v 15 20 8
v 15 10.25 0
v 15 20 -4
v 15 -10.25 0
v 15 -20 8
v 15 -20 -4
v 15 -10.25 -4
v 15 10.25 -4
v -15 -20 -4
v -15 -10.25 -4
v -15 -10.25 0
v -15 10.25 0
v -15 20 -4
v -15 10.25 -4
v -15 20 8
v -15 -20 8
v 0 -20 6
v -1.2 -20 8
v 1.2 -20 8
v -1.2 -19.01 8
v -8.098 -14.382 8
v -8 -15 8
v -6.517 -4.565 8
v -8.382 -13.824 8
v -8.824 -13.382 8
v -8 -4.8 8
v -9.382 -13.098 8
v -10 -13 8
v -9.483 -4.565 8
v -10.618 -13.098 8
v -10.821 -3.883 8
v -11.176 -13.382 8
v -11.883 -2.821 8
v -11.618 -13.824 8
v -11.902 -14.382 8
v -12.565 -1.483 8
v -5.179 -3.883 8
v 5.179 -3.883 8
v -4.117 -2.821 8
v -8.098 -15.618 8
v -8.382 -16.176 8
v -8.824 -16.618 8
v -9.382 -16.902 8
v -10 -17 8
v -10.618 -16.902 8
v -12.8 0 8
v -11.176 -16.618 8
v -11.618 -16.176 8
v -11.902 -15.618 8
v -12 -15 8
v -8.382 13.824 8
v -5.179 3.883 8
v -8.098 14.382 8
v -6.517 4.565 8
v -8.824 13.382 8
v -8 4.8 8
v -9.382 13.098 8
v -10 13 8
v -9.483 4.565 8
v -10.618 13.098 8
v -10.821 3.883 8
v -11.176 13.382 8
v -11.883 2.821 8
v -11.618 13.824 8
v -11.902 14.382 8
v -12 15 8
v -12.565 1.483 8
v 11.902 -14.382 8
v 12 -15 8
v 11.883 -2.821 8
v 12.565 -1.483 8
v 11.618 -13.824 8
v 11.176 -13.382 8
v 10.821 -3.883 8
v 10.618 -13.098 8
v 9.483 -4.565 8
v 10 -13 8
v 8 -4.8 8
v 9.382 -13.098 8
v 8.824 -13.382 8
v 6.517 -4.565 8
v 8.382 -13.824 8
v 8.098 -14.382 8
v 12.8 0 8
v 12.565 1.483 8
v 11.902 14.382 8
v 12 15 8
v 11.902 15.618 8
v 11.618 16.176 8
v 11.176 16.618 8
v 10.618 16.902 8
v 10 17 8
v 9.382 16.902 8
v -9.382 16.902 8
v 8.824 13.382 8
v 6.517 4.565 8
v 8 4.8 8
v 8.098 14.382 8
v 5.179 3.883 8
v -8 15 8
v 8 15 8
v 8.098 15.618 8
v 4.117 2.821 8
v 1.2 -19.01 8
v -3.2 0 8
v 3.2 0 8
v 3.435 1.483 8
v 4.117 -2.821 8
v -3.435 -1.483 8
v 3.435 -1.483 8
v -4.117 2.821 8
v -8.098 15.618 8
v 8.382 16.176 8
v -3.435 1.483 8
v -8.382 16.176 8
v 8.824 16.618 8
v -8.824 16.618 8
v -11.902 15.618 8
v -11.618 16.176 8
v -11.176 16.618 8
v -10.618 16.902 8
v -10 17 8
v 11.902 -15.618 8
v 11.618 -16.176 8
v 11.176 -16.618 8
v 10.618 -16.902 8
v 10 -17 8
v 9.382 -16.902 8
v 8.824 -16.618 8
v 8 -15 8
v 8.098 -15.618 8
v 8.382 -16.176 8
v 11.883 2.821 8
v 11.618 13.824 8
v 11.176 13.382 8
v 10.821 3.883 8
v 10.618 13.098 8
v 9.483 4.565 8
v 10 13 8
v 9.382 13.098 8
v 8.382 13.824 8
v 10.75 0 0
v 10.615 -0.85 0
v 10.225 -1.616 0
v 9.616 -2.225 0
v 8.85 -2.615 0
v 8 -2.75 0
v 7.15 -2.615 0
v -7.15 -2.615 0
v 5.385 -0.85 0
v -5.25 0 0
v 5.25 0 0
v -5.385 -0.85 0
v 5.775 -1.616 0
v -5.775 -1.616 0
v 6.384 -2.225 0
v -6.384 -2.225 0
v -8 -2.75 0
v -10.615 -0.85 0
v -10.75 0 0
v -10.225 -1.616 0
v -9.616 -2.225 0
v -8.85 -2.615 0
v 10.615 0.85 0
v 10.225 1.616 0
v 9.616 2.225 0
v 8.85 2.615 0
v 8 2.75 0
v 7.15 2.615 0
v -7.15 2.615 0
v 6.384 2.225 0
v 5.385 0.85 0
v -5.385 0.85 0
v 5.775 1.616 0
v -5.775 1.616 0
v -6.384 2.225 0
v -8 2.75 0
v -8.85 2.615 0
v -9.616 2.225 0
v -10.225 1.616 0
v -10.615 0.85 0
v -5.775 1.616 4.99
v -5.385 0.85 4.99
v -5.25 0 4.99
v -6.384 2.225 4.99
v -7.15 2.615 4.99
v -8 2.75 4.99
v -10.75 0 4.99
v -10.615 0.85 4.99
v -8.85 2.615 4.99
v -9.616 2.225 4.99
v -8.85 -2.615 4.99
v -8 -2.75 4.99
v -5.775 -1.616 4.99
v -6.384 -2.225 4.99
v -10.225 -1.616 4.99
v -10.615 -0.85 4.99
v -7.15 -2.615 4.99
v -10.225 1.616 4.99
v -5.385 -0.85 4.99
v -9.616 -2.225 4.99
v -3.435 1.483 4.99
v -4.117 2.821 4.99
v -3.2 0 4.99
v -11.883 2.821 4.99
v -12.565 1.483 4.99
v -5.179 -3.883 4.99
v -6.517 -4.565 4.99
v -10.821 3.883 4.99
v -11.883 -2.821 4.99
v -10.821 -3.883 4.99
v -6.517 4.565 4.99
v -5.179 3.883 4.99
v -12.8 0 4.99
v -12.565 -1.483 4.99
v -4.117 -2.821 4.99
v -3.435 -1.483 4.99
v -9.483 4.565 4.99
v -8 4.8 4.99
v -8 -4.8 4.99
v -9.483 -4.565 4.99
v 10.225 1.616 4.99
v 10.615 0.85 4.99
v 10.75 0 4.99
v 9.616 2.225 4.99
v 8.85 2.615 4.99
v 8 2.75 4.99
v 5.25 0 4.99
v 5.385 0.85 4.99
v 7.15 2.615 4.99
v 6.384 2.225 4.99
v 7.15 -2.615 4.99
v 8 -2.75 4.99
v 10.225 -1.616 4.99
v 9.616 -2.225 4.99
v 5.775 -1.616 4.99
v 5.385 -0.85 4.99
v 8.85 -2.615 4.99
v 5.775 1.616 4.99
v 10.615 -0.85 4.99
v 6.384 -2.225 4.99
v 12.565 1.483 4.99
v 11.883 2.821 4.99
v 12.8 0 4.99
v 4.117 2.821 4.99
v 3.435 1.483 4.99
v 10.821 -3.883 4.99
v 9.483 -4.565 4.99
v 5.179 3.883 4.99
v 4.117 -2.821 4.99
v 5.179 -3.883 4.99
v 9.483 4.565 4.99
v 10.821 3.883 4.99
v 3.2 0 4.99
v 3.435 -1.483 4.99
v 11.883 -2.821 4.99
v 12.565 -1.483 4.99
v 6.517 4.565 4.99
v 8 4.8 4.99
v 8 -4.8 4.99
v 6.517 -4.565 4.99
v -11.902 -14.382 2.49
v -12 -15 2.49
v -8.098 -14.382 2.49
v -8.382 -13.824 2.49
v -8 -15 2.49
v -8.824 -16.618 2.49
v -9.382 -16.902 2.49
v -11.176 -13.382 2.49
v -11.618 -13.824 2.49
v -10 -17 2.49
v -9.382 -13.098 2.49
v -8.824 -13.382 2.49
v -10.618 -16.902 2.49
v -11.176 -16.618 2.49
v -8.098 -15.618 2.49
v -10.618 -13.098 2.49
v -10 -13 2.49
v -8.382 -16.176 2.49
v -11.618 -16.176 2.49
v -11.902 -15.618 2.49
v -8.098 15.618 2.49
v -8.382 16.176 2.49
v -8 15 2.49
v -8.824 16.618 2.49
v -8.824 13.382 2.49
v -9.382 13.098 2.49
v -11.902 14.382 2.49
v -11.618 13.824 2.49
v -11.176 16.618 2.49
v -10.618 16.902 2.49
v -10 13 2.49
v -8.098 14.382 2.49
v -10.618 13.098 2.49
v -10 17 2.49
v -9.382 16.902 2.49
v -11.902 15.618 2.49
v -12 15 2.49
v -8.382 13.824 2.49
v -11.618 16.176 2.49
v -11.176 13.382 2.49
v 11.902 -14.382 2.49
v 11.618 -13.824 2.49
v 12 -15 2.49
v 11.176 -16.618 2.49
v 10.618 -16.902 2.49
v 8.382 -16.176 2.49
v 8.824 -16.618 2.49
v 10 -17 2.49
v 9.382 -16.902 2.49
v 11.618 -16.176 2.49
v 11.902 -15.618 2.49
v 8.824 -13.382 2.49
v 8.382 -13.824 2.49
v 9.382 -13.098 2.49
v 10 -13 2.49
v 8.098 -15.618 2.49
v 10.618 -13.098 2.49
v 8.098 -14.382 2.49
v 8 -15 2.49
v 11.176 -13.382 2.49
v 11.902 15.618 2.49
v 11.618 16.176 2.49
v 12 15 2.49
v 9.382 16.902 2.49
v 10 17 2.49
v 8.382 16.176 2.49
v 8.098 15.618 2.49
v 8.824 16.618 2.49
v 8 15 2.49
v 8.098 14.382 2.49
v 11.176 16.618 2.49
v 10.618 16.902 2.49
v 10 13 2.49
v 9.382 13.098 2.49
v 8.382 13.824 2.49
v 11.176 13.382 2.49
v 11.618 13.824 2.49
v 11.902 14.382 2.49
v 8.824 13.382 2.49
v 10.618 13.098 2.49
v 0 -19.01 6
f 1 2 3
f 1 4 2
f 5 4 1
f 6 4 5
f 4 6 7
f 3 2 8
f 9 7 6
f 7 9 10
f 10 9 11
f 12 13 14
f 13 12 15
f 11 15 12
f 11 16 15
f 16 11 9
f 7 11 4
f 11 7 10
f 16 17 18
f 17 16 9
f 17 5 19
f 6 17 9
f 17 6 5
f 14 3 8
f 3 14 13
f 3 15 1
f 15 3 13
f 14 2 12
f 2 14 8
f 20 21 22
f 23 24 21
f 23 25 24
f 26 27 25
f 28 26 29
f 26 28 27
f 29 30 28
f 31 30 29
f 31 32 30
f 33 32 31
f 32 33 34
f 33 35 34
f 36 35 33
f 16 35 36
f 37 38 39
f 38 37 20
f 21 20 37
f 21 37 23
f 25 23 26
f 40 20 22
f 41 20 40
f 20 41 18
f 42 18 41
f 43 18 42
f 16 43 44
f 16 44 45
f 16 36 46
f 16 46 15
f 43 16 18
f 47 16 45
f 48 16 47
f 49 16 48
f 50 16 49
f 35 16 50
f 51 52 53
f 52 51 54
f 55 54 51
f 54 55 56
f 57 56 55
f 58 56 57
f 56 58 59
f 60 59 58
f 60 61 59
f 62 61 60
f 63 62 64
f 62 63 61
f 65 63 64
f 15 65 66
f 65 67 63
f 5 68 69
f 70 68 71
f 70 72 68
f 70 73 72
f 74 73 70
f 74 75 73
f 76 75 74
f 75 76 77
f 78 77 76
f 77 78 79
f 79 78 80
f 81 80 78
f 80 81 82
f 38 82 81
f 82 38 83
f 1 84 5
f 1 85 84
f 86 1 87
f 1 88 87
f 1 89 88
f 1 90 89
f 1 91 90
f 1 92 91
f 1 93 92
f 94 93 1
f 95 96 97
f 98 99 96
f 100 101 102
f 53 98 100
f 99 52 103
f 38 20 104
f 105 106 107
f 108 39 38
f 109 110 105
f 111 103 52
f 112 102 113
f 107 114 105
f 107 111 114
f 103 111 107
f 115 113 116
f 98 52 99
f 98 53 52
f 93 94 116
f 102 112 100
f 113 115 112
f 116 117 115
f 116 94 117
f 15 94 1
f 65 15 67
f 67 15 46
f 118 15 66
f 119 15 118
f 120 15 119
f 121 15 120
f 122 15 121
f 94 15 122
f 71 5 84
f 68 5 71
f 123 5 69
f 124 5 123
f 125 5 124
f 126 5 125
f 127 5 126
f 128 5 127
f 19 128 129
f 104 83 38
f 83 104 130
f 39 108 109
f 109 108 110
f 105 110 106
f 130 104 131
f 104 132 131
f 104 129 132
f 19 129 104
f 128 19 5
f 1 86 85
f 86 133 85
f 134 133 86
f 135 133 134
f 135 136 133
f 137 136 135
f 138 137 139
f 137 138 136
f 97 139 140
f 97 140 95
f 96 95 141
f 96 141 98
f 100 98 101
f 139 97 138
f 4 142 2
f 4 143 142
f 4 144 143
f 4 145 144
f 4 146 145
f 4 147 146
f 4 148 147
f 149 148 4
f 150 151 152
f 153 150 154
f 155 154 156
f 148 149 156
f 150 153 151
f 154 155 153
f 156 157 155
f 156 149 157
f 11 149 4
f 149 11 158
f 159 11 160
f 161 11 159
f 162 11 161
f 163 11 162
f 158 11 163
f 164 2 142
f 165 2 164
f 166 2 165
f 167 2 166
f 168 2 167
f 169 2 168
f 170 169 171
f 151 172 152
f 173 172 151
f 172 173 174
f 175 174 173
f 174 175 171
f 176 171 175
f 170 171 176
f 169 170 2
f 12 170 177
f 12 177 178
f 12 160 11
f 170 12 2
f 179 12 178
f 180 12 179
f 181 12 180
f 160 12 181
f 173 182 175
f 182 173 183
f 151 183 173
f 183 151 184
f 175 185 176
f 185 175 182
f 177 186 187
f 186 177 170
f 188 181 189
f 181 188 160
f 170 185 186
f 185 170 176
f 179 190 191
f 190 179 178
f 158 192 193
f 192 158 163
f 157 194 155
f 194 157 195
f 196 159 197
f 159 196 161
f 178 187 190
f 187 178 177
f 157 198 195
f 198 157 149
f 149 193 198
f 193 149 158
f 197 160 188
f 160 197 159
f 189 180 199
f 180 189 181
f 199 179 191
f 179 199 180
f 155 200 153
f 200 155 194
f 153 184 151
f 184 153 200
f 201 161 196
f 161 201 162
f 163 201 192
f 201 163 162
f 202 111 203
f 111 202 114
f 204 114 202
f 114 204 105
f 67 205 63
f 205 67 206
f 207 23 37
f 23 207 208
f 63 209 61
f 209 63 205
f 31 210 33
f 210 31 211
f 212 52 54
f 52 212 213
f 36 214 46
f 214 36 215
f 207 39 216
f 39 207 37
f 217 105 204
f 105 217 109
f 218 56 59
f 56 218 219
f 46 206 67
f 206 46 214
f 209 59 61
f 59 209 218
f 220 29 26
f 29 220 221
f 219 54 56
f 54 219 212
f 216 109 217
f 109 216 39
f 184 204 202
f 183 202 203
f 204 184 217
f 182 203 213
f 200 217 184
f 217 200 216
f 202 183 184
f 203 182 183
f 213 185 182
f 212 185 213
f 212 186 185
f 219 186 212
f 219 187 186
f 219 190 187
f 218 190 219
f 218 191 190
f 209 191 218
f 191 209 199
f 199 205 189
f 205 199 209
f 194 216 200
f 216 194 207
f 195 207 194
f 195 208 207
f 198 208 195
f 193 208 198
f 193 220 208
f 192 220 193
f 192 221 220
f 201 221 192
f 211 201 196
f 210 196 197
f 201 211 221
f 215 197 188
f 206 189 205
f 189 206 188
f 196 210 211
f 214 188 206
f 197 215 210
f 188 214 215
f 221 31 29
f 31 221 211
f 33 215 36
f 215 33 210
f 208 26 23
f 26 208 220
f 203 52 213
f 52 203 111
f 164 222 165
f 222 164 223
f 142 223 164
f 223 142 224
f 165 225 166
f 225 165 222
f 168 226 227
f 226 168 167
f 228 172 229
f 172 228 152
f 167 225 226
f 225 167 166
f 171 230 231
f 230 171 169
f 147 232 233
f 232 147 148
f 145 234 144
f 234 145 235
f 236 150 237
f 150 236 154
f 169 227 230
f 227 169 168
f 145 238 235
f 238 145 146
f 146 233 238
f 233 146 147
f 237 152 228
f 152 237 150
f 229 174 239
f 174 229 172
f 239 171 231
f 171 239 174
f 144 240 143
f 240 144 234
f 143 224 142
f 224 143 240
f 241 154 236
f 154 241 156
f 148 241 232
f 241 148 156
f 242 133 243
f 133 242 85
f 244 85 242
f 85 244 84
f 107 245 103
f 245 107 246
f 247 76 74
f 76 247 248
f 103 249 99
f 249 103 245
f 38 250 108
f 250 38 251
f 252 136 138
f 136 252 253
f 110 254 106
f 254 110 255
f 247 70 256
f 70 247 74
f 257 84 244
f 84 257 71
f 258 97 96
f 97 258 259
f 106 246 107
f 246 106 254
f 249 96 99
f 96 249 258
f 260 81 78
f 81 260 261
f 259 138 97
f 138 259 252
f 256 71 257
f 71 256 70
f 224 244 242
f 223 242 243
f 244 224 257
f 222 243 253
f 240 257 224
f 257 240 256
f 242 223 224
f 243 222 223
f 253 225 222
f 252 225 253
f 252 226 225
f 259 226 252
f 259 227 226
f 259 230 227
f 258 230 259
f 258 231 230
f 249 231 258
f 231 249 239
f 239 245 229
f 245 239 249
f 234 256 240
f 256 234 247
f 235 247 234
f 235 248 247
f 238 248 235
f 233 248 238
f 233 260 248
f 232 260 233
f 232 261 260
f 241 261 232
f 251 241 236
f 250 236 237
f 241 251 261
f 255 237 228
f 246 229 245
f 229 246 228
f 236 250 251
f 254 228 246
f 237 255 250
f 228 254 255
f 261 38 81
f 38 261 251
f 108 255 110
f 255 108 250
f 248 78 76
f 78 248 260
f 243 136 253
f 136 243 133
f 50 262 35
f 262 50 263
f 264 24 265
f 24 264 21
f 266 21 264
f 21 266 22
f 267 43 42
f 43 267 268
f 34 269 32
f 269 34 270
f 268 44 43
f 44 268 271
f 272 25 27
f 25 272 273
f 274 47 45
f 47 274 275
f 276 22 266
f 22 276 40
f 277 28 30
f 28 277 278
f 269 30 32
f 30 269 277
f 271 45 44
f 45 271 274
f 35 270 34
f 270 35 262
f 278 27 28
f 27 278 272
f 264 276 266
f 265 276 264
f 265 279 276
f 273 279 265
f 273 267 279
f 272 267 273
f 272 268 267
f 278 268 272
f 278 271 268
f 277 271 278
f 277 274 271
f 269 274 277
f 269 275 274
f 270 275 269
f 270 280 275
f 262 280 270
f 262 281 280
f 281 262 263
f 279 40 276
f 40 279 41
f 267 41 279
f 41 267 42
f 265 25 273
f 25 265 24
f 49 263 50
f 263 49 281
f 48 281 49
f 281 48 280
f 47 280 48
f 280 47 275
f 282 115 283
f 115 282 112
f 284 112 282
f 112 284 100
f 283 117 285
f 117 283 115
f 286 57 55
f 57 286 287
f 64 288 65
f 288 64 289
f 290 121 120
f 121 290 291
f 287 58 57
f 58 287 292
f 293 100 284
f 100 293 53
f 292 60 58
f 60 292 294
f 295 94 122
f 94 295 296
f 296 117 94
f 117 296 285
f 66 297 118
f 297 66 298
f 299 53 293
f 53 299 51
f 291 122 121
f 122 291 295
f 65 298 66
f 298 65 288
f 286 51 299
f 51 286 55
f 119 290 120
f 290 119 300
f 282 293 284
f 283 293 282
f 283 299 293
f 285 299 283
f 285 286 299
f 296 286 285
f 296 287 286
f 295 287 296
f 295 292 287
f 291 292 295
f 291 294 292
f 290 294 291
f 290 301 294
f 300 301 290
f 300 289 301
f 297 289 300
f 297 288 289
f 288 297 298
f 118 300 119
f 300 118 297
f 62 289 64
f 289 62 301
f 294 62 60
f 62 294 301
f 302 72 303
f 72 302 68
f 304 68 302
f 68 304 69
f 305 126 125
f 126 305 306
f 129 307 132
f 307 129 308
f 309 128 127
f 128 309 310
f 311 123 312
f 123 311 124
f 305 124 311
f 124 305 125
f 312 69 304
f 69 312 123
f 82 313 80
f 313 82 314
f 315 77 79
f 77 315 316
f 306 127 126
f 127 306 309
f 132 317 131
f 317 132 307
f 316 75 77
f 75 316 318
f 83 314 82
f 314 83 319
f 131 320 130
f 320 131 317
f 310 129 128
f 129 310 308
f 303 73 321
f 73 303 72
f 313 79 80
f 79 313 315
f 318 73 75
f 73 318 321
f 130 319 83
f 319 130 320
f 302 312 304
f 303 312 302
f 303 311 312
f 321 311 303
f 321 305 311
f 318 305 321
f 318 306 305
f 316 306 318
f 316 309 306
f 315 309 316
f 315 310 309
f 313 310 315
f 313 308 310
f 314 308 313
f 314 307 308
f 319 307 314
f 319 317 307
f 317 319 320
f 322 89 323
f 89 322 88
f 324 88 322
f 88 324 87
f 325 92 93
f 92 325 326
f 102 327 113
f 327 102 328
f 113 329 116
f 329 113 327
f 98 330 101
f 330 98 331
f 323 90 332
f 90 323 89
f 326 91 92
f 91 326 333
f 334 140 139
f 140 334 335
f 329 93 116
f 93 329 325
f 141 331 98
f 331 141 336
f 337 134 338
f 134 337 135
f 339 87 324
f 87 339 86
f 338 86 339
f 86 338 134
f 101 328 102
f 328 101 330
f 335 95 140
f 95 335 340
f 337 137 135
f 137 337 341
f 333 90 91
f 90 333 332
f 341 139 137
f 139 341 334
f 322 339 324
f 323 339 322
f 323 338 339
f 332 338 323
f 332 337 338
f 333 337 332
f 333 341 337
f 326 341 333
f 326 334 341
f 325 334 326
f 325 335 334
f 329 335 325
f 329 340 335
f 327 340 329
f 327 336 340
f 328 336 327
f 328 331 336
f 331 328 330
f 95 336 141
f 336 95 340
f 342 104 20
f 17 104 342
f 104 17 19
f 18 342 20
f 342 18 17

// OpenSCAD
// file: layout_gen.scad
// layout_gen.scad: optical layout of the laboratory bench: element positions, rails, carrier positions and required
// beam diameters. Every other file takes its positions from here.
// Units: mm. Top view: x to the east, y to the north; z up. Beams travel in the plane z = rail + axis_h.
f0 = 230.3615;
cube = 25.400;
gap = 12.000;
x3 = 75.000;
lens_d = 50.800;
opt_d = 25.400;
rail = 20.000;
axis_h = 60.000;
obj_w = 8.1920;
pupil_d = 15.3190;
ring2_d = 4.3085;
roi_d = 4.7872;
stop_d = 0.2394;
ring2_inner_d = 2.3936;
P_fibre = [262.700, 0.000, 180];   // laser output (fiber tip)
P_col = [162.700, 0.000, 180];   // collimator
P_pol = [120.200, 0.000, 180];   // polarizer
P_bs0 = [75.000, 0.000, 180];   // splitter cube
P_c1 = [0.000, 0.000, 180];   // input cube
P_im = [-24.700, 0.000, 180];   // input modulator
P_dump1 = [0.000, 42.700, 90];   // beam dump
P_an1 = [0.000, -57.700, 270];   // analyzer 1
P_l1 = [0.000, -214.345, 270];   // lens L1
P_c2 = [0.000, -428.691, 270];   // Fourier cube
P_am = [0.000, -453.391, 270];   // amplitude modulator
P_fc = [-24.700, -428.691, 180];   // Fourier camera with zero-order stop
P_an2 = [37.500, -428.691, 0];   // analyzer 2
P_sh = [75.000, -120.000, 270];   // reference shutter
P_va = [75.000, -200.000, 270];   // variable attenuator
P_c3 = [75.000, -428.691, 0];   // combiner cube
P_pm = [75.000, -519.707, 270];   // phase modulator with annular stop
P_l2 = [223.029, -428.691, 0];   // lens L2
P_is = [453.391, -428.691, 0];   // image sensor
P_as = [75.000, -505.707, 270];   // annular stop
R_north = [-79.700, 0.000, 307.700, 0.000];
R_south = [-79.700, -428.691, 508.391, -428.691];
R_west = [0.000, -30.000, 0.000, -398.691];
R_ref = [75.000, -30.000, 75.000, -398.691];
R_stub = [75.000, -458.691, 75.000, -579.707];
C_fibre = [262.700, 0.000, 0];   // carrier center, rail direction in degrees
C_col = [162.700, 0.000, 0];   // carrier center, rail direction in degrees
C_pol = [120.200, 0.000, 0];   // carrier center, rail direction in degrees
C_bs0 = [75.000, 0.000, 0];   // carrier center, rail direction in degrees
C_c1 = [0.000, 0.000, 0];   // carrier center, rail direction in degrees
C_im = [-45.000, 0.000, 0];   // carrier center, rail direction in degrees
C_an1 = [0.000, -57.700, 90];   // carrier center, rail direction in degrees
C_l1 = [0.000, -214.345, 90];   // carrier center, rail direction in degrees
C_fc = [-45.000, -428.691, 0];   // carrier center, rail direction in degrees
C_c2 = [0.000, -428.691, 0];   // carrier center, rail direction in degrees
C_an2 = [37.500, -428.691, 0];   // carrier center, rail direction in degrees
C_c3 = [75.000, -428.691, 0];   // carrier center, rail direction in degrees
C_l2 = [223.029, -428.691, 0];   // carrier center, rail direction in degrees
C_is = [477.391, -428.691, 0];   // carrier center, rail direction in degrees
C_sh = [75.000, -120.000, 90];   // carrier center, rail direction in degrees
C_va = [75.000, -200.000, 90];   // carrier center, rail direction in degrees
C_as = [75.000, -505.707, 90];   // carrier center, rail direction in degrees
C_pm = [75.000, -540.007, 90];   // carrier center, rail direction in degrees
carrier_l = 30.000;
tray = [183.029, -310.000, 200.000, 150.000];   // electronics tray: x0, y0, width, depth
ca_icube = 13.4949;   // required beam diameter at the input cube
ca_lens = 26.9043;   // required beam diameter at the Fourier lenses L1 and L2
ca_fcube = 16.7632;   // required beam diameter at the Fourier cube
ca_comb = 20.0983;   // required beam diameter at the combiner cube
ca_sensor = 11.5852;   // required beam diameter at the image sensor
FOOT = [-119.700, -619.707, 548.391, 127.700];   // x_min, y_min, x_max, y_max
// file: parts_misc.scad
// parts_misc.scad: fiber holder, laser V-block, shutter bracket and flag, beam dump, rail foot, corner bracket,
// enclosure post, electronics tray.
// DESIGN ONLY: not printed, not built.
// Local frames: holders as in parts_mounts.scad (z = 0 = carrier top, beam along +x through (0, 0, ha));
// beam dump, rail foot, corner bracket, post and tray stand on the base board (z = 0 = board).
// Print orientation: as modeled; the shutter flag flat. No supports except the servo window (bridged).
// Hardware: fiber adapter 2 x M2.5; V-block strap 2 x M3; servo 2 x M2 self-tapping; rail foot and corner
// bracket M5 into T-nuts plus one screw into the base board; post 2 screws into the board; tray boards on
// M3 stand-offs or adhesive clips.
include <params.scad>
use <parts_mounts.scad>

module hole_x(d, l) { rotate([0, 90, 0]) translate([0, 0, -0.01]) cylinder(d = d, h = l + 0.02, $fn = fn_s); }

// ---- 6a. fiber holder: plate with a bore for a bulkhead fiber adapter, tip at the collimator focus.
fib_bore = 9.6;     // bulkhead adapter barrel (generic; set to the adapter used)
fib_pitch = 14;     // flange screw pitch (generic)
module fiber_holder() {
  w = 40; top = ha + 16;
  difference() {
    union() {
      foot();
      translate([-3, -w / 2, 0]) cube([6, w, top]);
    }
    translate([-3, 0, ha]) hole_x(fib_bore, 6);
    for (s = [-1, 1]) translate([-3, s * fib_pitch / 2, ha]) hole_x(m25_d, 6);
  }
}

// ---- 6b. V-block for a 12 mm laser module barrel (alternative to the fiber holder).
module laser_vblock(d = 12) {
  h = ha - d / 2 * sqrt(2);                                // bottom of the V so that the barrel axis is at ha
  difference() {
    union() {
      foot();
      translate([-car_l / 2, -12, 0]) cube([car_l, 24, ha + 2]);
    }
    translate([-car_l / 2 - 0.01, 0, h]) rotate([90, 0, 90]) linear_extrude(car_l + 0.02)
      polygon([[0, 0], [14, 14], [-14, 14]]);
    for (s = [-1, 1]) translate([0, s * 9.5, ha + 2 - m3_ins_h]) cylinder(d = m3_ins, h = m3_ins_h + 0.01, $fn = fn_s);
  }
}

// ---- 7a. shutter bracket: upright with a clear bore for the reference beam and a window for a micro servo
// whose shaft is parallel to the beam, above it. The flag swings in the plane normal to the beam.
module shutter_bracket() {
  w = 46; top = ha + sh_axis + servo_h / 2 + 6;
  difference() {
    union() {
      foot();
      translate([-3, -w / 2, 0]) cube([6, w, top]);
    }
    translate([-3, 0, ha]) hole_x(sh_bore, 6);
    translate([-3.01, -servo_w / 2, ha + sh_axis - servo_h / 2]) cube([6.02, servo_w, servo_h]);
    for (s = [-1, 1]) translate([-3, s * servo_ear / 2, ha + sh_axis]) hole_x(1.8, 6);
  }
}

// ---- 7b. shutter flag: paddle on the servo horn; covers the bore when turned down.
module shutter_flag() {
  difference() {
    union() {
      cylinder(d = 12, h = 1.6);
      translate([-13, -sh_axis - 14, 0]) cube([26, sh_axis + 14, 1.6]);
    }
    translate([0, 0, -0.01]) cylinder(d = 4.9, h = 1.62, $fn = fn_s);       // horn hub
    for (s = [-1, 1]) translate([0, s * 4, -0.01]) cylinder(d = 1.5, h = 1.62, $fn = fn_s);
  }
}

// ---- 8. beam dump on a pedestal standing on the base board; entrance faces -x at the axis height.
module beam_dump() {
  b = 34; depth = 34;
  difference() {
    union() {
      translate([-5, -25, 0]) cube([depth + 10, 50, 5]);                    // flange
      translate([0, -b / 2, 0]) cube([depth, b, ha_board + b / 2]);
    }
    translate([-0.01, 0, ha_board]) difference() {                           // blind bore with a cone at the bottom
      rotate([0, 90, 0]) cylinder(d = 24, h = depth - 5);
      translate([depth - 5 - 14, 0, 0]) rotate([0, 90, 0]) cylinder(d1 = 2, d2 = 20, h = 14.01);
    }
    for (s = [-1, 1]) translate([depth / 2, s * 21, -0.01]) cylinder(d = 4.5, h = 5.02, $fn = fn_s);
  }
}

// ---- 9a. rail foot: angle clip that fixes a rail to the base board (M5 into the side slot, screw into the board).
module rail_foot() {
  difference() {
    union() {
      cube([20, 22, 5]);
      cube([20, 5, 15]);
    }
    translate([10, 5 + 9, -0.01]) cylinder(d = 4.5, h = 5.02, $fn = fn_s);
    translate([10, -0.01, 10]) rotate([-90, 0, 0]) cylinder(d = m5_d, h = 5.02, $fn = fn_s);
  }
}

// ---- 9b. corner bracket: joins two rails at a right angle through their side slots; bridges the end gap.
// 15 mm high so that it passes under the carrier skirts.
module corner_bracket(gap = 20) {
  la = 34; lb = gap + 34;
  difference() {
    union() {
      cube([la, 5, 15]);
      cube([5, lb, 15]);
      linear_extrude(4) polygon([[0, 0], [la, 0], [0, 26]]);
    }
    translate([la - 10, -0.01, 10]) rotate([-90, 0, 0]) cylinder(d = m5_d, h = 5.02, $fn = fn_s);
    translate([-0.01, lb - 10, 10]) rotate([0, 90, 0]) cylinder(d = m5_d, h = 5.02, $fn = fn_s);
  }
}

// ---- 10a. enclosure post: corner post with two slots that take 3 mm opaque sheet panels.
module enclosure_post(sheet = 3.2) {
  difference() {
    union() {
      cube([24, 24, post_h]);
      cube([44, 44, 5]);
    }
    translate([24 - 10, 8, 5]) cube([10.01, sheet, post_h]);                // slot towards +x
    translate([8, 24 - 10, 5]) cube([sheet, 10.01, post_h]);                // slot towards +y
    for (p = [[34, 12], [12, 34]]) translate([p[0], p[1], -0.01]) cylinder(d = 4.5, h = 5.02, $fn = fn_s);
  }
}

// ---- 10b. electronics tray: bays for a USB hub, three panel driver boards and a microcontroller board.
tray_bays = [[4, 4, 100, 52], [108, 4, 88, 52], [4, 60, 62, 86], [70, 60, 62, 86], [136, 60, 60, 86]];
module electronics_tray() {
  difference() {
    cube([tray[2], tray[3], 8]);                                           // bays below assume 200 x 150
    for (b = tray_bays) translate([b[0], b[1], 2]) cube([b[2], b[3], 6.01]);
    for (p = [[6, 6], [194, 6], [6, 144], [194, 144]]) translate([p[0], p[1], -0.01]) cylinder(d = 4.5, h = 8.02, $fn = fn_s);
  }
}
// file: parts_panels.scad
// parts_panels.scad: mounts for the reflective modulator panels and for the two camera boards.
// DESIGN ONLY: not printed, not built. The board outlines are generic; replace them by the drawings of the chosen
// commercial parts (params.scad: pan_bw, pan_bh, pan_stack, cam_b, cam_hole, cam_stack).
// Local frame: the active surface (panel or sensor) is centered at (0, 0, h_axis) and faces -x; the beam arrives
// travelling along +x; every printed body lies at x > 0 except the stop cap. z = 0 is the mounting face.
// Print orientation: frames and camera mounts as modeled (foot down); tilt plate, stop cap and slide parts flat.
// Hardware: panel board 4 x M2.5; tilt plate 3 x M3 x 16 with compression springs into inserts of the frame;
// camera board 4 x M2; slide 2 x M3 x 12 in slots, 1 x M3 fine screw; frames 4 x M3 x 10 into the carrier
// (rail version) or 2 x M5 into the base board (board version).
include <params.scad>
use <parts_mounts.scad>

pan_pw = pan_bw + 16;                    // tilt plate width
pan_ph = pan_bh + 16;                    // tilt plate height
pan_adj = [[-(pan_pw / 2 - 5), pan_ph / 2 - 5], [pan_pw / 2 - 5, pan_ph / 2 - 5], [-(pan_pw / 2 - 5), -(pan_ph / 2 - 5)]];
x_plate = pan_stack;                     // tilt plate front face (board back face)
x_frame = pan_stack + pan_plate_t + pan_gap;
foot_x  = 20.3;                          // carrier center behind the active surface (layout: C_im, C_fc, C_pm)

module hole_x(d, l) { rotate([0, 90, 0]) translate([0, 0, -0.01]) cylinder(d = d, h = l + 0.02, $fn = fn_s); }

// ---- 4a. tip/tilt plate: carries the panel board on its front face. Modelled in place (x from x_plate).
module panel_tilt_plate(h_axis = ha) {
  difference() {
    translate([x_plate, -pan_pw / 2, h_axis - pan_ph / 2]) cube([pan_plate_t, pan_pw, pan_ph]);
    for (p = pan_adj) translate([x_plate, p[0], h_axis + p[1]]) hole_x(m3_d, pan_plate_t);
    for (sy = [-1, 1], sz = [-1, 1])     // board screws in horizontal slots: lateral adjustment
      hull() for (dy = [-pan_slot / 2, pan_slot / 2])
        translate([x_plate, sy * (pan_bw / 2 - 3) + dy, h_axis + sz * (pan_bh / 2 - 3)]) hole_x(m25_d, pan_plate_t);
  }
}

// ---- 4b. fixed frame. on_board = false: foot on a rail carrier; true: pedestal on the base board (taller).
module panel_frame(on_board = false) {
  h_axis = on_board ? ha_board : ha;
  top = h_axis + pan_ph / 2;
  difference() {
    union() {
      if (on_board) translate([foot_x - 22, -30, 0]) cube([44, 60, foot_t]);
      else translate([foot_x, 0, 0]) foot();
      translate([x_frame, -pan_pw / 2, 0]) cube([pan_frame_t, pan_pw, top]);
      for (s = [-1, 1]) translate([0, s * ((on_board ? 30 : car_w / 2) - 2), foot_t])   // gussets behind the frame
        rotate([90, 0, 0]) translate([0, 0, -2]) linear_extrude(4)
          polygon([[x_frame + pan_frame_t, 0], [foot_x + 14, 0], [x_frame + pan_frame_t, on_board ? 40 : 22]]);
    }
    for (p = pan_adj) translate([x_frame, p[0], h_axis + p[1]]) hole_x(m3_ins, pan_frame_t);
    translate([x_frame, 0, h_axis]) hole_x(18, pan_frame_t);                  // cable window
    if (on_board) for (s = [-1, 1]) hull() for (dx = [-4, 4])                 // 2 x M5 slots into the base board
      translate([foot_x + 8 + dx, s * 22, -0.01]) cylinder(d = m5_d, h = foot_t + 0.02, $fn = fn_s);
  }
}

// ---- 5a. fixed camera mount (Fourier camera). Board back face at x = cam_stack, on four bosses.
module camera_upright(h_axis, x0) {                      // upright with bosses; x0 = front face of the upright
  w = cam_b + 8;
  difference() {
    union() {
      translate([x0, -w / 2, 0]) cube([6, w, h_axis + cam_b / 2 + 4]);
      for (sy = [-1, 1], sz = [-1, 1]) translate([cam_stack, sy * cam_hole / 2, h_axis + sz * cam_hole / 2])
        rotate([0, 90, 0]) cylinder(d = 6, h = x0 - cam_stack + 0.01, $fn = fn_s);
    }
    for (sy = [-1, 1], sz = [-1, 1]) translate([cam_stack, sy * cam_hole / 2, h_axis + sz * cam_hole / 2])
      hole_x(m2_d, x0 - cam_stack + 6);
    translate([x0, 0, h_axis]) hole_x(20, 6);                                 // connector window
  }
}

module camera_mount_fixed() {
  union() {
    translate([foot_x, 0, 0]) foot();
    camera_upright(ha, cam_stack + 3);
  }
}

// ---- 5b. zero-order stop cap: holds a 12.7 mm window with the stop dot close in front of the sensor.
// Modelled in place: plate at x = -3 .. -1, legs back to the board front face.
module stop_cap(h_axis = ha) {
  board_front = cam_stack - 1.6;
  difference() {
    union() {
      translate([-3, -cam_b / 2, h_axis - cam_b / 2]) cube([2, cam_b, cam_b]);
      for (sy = [-1, 1], sz = [-1, 1]) translate([-1.01, sy * cam_hole / 2, h_axis + sz * cam_hole / 2])
        rotate([0, 90, 0]) cylinder(d = 5, h = board_front + 1.01, $fn = fn_s);
    }
    for (sy = [-1, 1], sz = [-1, 1]) translate([-3, sy * cam_hole / 2, h_axis + sz * cam_hole / 2])
      hole_x(m2_d, board_front + 3);
    translate([-3, 0, h_axis]) hole_x(stop_hole, 2);                          // light path
    translate([-3, 0, h_axis]) hole_x(12.7 + 2 * clr, 1.0);                   // window pocket
  }
}

// ---- 5c. image sensor on a fine-focus slide along the beam. Base on the carrier (center at x = 24).
slide_c = 24;                            // carrier center (layout: C_is)
module camera_slide_base() {
  difference() {
    union() {
      translate([-4, -car_w / 2, 0]) cube([56, car_w, foot_t]);
      translate([46, -10, 0]) cube([6, 20, foot_t + 14]);                     // end block of the fine screw
    }
    for (sx = [-1, 1], sy = [-1, 1]) translate([slide_c + sx * pat_x, sy * pat_y, 0]) {
      translate([0, 0, -0.01]) cylinder(d = m3_d, h = foot_t + 0.02, $fn = fn_s);
      translate([0, 0, foot_t - 3.2]) cylinder(d = 6.2, h = 3.3, $fn = fn_s);  // heads below the carriage
    }
    for (sy = [-1, 1]) translate([22, sy * 12, foot_t - m3_ins_h]) cylinder(d = m3_ins, h = m3_ins_h + 0.01, $fn = fn_s);
    translate([46, 0, foot_t + 8]) hole_x(m3_ins, 6);                         // M3 x 0.5 fine screw, along the beam
  }
}

module camera_slide_carriage() {
  difference() {
    union() {
      translate([3, -car_w / 2, foot_t]) cube([38, car_w, 6]);
      translate([0, 0, foot_t]) camera_upright(ha - foot_t, cam_stack + 3);
    }
    for (sy = [-1, 1]) hull() for (dx = [-slide_travel, slide_travel])        // slots: +- travel
      translate([22 + dx, sy * 12, foot_t - 0.01]) cylinder(d = m3_d, h = 6.02, $fn = fn_s);
  }
}
// file: parts_mounts.scad
// parts_mounts.scad: rail carrier, lens / optic holder with retaining ring, cube table with clamp.
// DESIGN ONLY: not printed, not built.
// Local frame of every holder: z = 0 is the top face of the rail carrier, the beam travels along +x through
// (0, 0, ha). Print orientation: as modeled (foot down), no supports; bores bridge at the top.
// Hardware: carrier 2 x M5 x 10 into rail T-nuts, 4 x M3 heat-set inserts; holders 4 x M3 x 10 into the carrier;
// retaining ring 3 x M3 x 8 into inserts of the holder; cube clamp 1 x M3 x 12 + 1 x M3 nylon-tip set screw.
include <params.scad>

module hole(d, h, fn = fn_s) { translate([0, 0, -0.01]) cylinder(d = d, h = h + 0.02, $fn = fn); }

// ---- foot plate with the 4 x M3 pattern of the carrier (local x = along the rail)
module foot(l = car_l, w = car_w) {
  difference() {
    translate([-l / 2, -w / 2, 0]) cube([l, w, foot_t]);
    for (sx = [-1, 1], sy = [-1, 1]) translate([sx * pat_x, sy * pat_y, 0]) hole(m3_d, foot_t);
  }
}

// ---- 1. rail carrier: saddle on the rail. Local x = along the rail, z = 0 at the rail top face.
module rail_carrier() {
  difference() {
    union() {
      translate([-car_l / 2, -car_w / 2, 0]) cube([car_l, car_w, car_t]);
      for (s = [-1, 1])                                   // skirts along both rail sides
        translate([-car_l / 2, s > 0 ? rail / 2 + clr : -car_w / 2, -car_skirt])
          cube([car_l, car_w / 2 - rail / 2 - clr, car_skirt + 0.01]);
    }
    for (s = [-1, 1]) translate([s * 8, 0, 0]) {          // 2 x M5 into T-nuts, counterbored
      hole(m5_d, car_t);
      translate([0, 0, car_t - 3]) hole(m5_head, 3.5);
    }
    for (sx = [-1, 1], sy = [-1, 1])                      // 4 x M3 inserts for the holders
      translate([sx * pat_x, sy * pat_y, car_t - m3_ins_h]) hole(m3_ins, m3_ins_h);
    translate([0, -car_w / 2 - 0.01, car_t - 2]) rotate([-90, 0, 0])   // index mark at the center
      linear_extrude(1) polygon([[-1.5, -2.5], [1.5, -2.5], [0, 0]]);
  }
}

// ---- 2. holder for a round optic of diameter d, centered on the beam at height h_axis above the foot bottom
module lens_holder(d = lens_d, h_axis = ha) {
  w = d + 2 * rim;
  top = h_axis + d / 2 + rim;
  bc = d / 2 + 5.5;                                       // bolt circle of the retaining ring
  difference() {
    union() {
      foot(car_l, max(car_w, w));
      translate([-up_t / 2, -w / 2, 0]) cube([up_t, w, top]);
      for (s = [-1, 1]) translate([0, s * (w / 2 - 3), foot_t])   // two gussets
        rotate([90, 0, 0]) translate([0, 0, -1.5]) linear_extrude(3)
          polygon([[-car_l / 2, 0], [car_l / 2, 0], [up_t / 2, 12], [-up_t / 2, 12]]);
    }
    translate([-up_t / 2, 0, h_axis]) rotate([0, 90, 0]) hole(d - 2 * lip - 0.6, up_t, $fn);          // clear bore
    translate([up_t / 2 - seat_d, 0, h_axis]) rotate([0, 90, 0]) hole(d + 2 * clr, seat_d, $fn);    // seat
    for (a = [90, 210, 330]) translate([up_t / 2 - m3_ins_h, bc * cos(a), h_axis + bc * sin(a)])
      rotate([0, 90, 0]) hole(m3_ins, m3_ins_h);
  }
}

module retaining_ring(d = lens_d) {
  bc = d / 2 + 5.5;
  difference() {
    cylinder(d = d + 2 * rim - 2, h = ring_t);
    hole(d - 2 * lip - 0.6, ring_t, $fn);
    for (a = [90, 210, 330]) translate([bc * cos(a), bc * sin(a), 0]) hole(m3_d, ring_t);
  }
}

// ---- 3. cube table: seat for the beam-splitter cube, center on the beam; four free ports.
module cube_table() {
  seat = ha - cube / 2;                                   // seat height above the foot bottom
  pw = cube + 2 * cube_fence_t + 2 * clr;                 // pedestal width
  difference() {
    union() {
      foot();
      translate([-pw / 2, -pw / 2, 0]) cube([pw, pw, seat]);
      // locating corner: two fences, lower than the beam
      translate([-pw / 2, -pw / 2, seat]) cube([pw, cube_fence_t, cube_fence_h]);
      translate([-pw / 2, -pw / 2, seat]) cube([cube_fence_t, pw, cube_fence_h]);
      // clamp post at the locating corner, outside every beam port
      translate([-pw / 2 - cube_post + cube_fence_t, -pw / 2 - cube_post + cube_fence_t, 0])
        cube([cube_post, cube_post, seat + cube + 1]);
    }
    // post: insert for the clamp screw
    translate([-pw / 2 - cube_post / 2 + cube_fence_t, -pw / 2 - cube_post / 2 + cube_fence_t,
               seat + cube + 1 - m3_ins_h]) hole(m3_ins, m3_ins_h);
    // access to the foot screws under the pedestal overhang is from the sides: nothing to cut
  }
}

// ---- cube clamp: plate over the cube top, bolted on the post, set screw over the cube center.
module cube_clamp() {
  pw = cube + 2 * cube_fence_t + 2 * clr;
  o = -pw / 2 - cube_post + cube_fence_t;                 // outer corner of the post
  difference() {
    translate([o, o, 0]) cube([cube / 2 - o + 6, cube / 2 - o + 6, 4]);
    translate([o + cube_post / 2, o + cube_post / 2, 0]) hole(m3_d, 4);
    hole(2.9, 4);                                         // M3 tapped (self-cut) for the nylon-tip set screw
  }
}
// file: params.scad
// params.scad: every mechanical parameter of the printed mount kit (reference hardware design).
// DESIGN ONLY: not printed, not built.
// Optical layout numbers (stations, rails, beam sizes) are defined in layout_gen.scad and follow from the optical
// parameters of the design. Do not retype positions here.
include <layout_gen.scad>

// ---- print and fit
clr      = 0.25;    // general print clearance per side
$fn      = 48;      // facets of optical bores (screw holes use fn_s)
fn_s     = 20;

// ---- fasteners
m5_d     = 5.5;     // M5 clearance (rail T-nuts)
m5_head  = 9.6;     // M5 button-head counterbore diameter
m3_d     = 3.4;     // M3 clearance
m3_ins   = 4.0;     // hole for an M3 heat-set insert
m3_ins_h = 5.5;     // insert hole depth
m25_d    = 2.9;     // M2.5 clearance (boards)
m2_d     = 2.4;     // M2 clearance (camera boards)

// ---- rail carrier (saddle on the 20 x 20 slotted rail)
car_l    = carrier_l;   // along the rail (from the layout: neighboring carriers must not overlap)
car_w    = 40;          // across the rail
car_t    = 8;           // plate thickness above the rail top
car_skirt = 4;          // skirt depth down the rail sides
pat_x    = 10;          // M3 insert pattern, half pitch along the rail
pat_y    = 15;          // M3 insert pattern, half pitch across the rail

// ---- heights
z_carrier = rail + car_t;          // top face of a carrier above the base board
ha        = axis_h - car_t;        // optical axis above the top face of a carrier (52 mm)
ha_board  = rail + axis_h;         // optical axis above the base board (80 mm)

// ---- holders
foot_t   = 6;       // foot plate thickness of every holder
up_t     = 10;      // upright thickness along the beam
rim      = 10;      // material around a bore
lip      = 1.2;     // seat lip that the optic rests on
seat_d   = 6;       // seat depth
ring_t   = 3;       // retaining ring thickness

// ---- cube table
cube_fence_h = 1.5; // locating fences (below the beam: the beam bottom is 10.05 mm below the cube center)
cube_fence_t = 3;
cube_post    = 8;   // clamp post section

// ---- panel mount (reflective modulator on a carrier board)
pan_bw   = 40;      // board width (horizontal)
pan_bh   = 32;      // board height
pan_stack = 3.0;    // reflective surface in front of the board back face
pan_plate_t = 4;    // tip/tilt plate thickness
pan_gap  = 4;       // spring gap between the tilt plate and the frame
pan_frame_t = 6;
pan_slot = 3.0;     // board slots: +-1.5 mm lateral adjustment

// ---- camera boards
cam_b    = 38;      // square board
cam_hole = 34;      // hole pitch
cam_stack = 4.0;    // sensor surface in front of the board back face
slide_travel = 3;   // +- fine focus travel of the image sensor

// ---- shutter (micro servo)
servo_w  = 23.0;    // body
servo_h  = 12.6;
servo_ear = 28.0;   // screw pitch
sh_bore  = 22;      // clear bore of the shutter bracket
sh_axis  = sh_bore / 2 + 6 + servo_h / 2;   // servo shaft above the beam axis
post_h   = 130;     // enclosure post height
stop_hole = 10;     // light hole of the zero-order stop cap (the camera reads the central roi_d only)

// ---- beams used by the clearance check (diameters from the layout; the check adds beam_margin in assembly.scad)
beam_col  = obj_w * sqrt(2);       // collimated beam over the object diagonal
beam_lens = pupil_d + obj_w * sqrt(2);
beam_ref  = 8;                     // the reference arm uses the central ring2_d = 4.31 mm only
beam_fc   = 8;                     // the Fourier camera reads the central roi_d = 4.79 mm only

// ---- colors of the assembly
c_print = "#CFCECE";  c_rail = "#6F6F6F";  c_l1 = "#3775BA";  c_l2 = "#DAA87C";  c_beam = "#8BCF8B";
c_glass = "#B8C9E5";
// main file
// export.scad: one printable part per call:  openscad -D 'part="lens_holder_50"' -o ../stl/lens_holder_50.stl export.scad
// DESIGN ONLY: not printed, not built. Parts are exported in their modeled frame (see the part files for the
// print orientation); panel_tilt_plate, stop_cap and camera_slide_carriage are moved to the origin of their own
// frame by the slicer.
include <params.scad>
use <parts_mounts.scad>
use <parts_panels.scad>
use <parts_misc.scad>
part = "rail_carrier";
if (part == "rail_carrier") rail_carrier();
if (part == "lens_holder_50") lens_holder(lens_d);
if (part == "lens_holder_25") lens_holder(opt_d);
if (part == "lens_holder_12") lens_holder(opt_d / 2);
if (part == "retaining_ring_50") retaining_ring(lens_d);
if (part == "retaining_ring_25") retaining_ring(opt_d);
if (part == "retaining_ring_12") retaining_ring(opt_d / 2);
if (part == "cube_table") cube_table();
if (part == "cube_clamp") cube_clamp();
if (part == "panel_frame_rail") panel_frame(false);
if (part == "panel_frame_board") panel_frame(true);
if (part == "panel_tilt_plate") panel_tilt_plate(ha);
if (part == "camera_mount_fixed") camera_mount_fixed();
if (part == "stop_cap") stop_cap(ha);
if (part == "camera_slide_base") camera_slide_base();
if (part == "camera_slide_carriage") camera_slide_carriage();
if (part == "fiber_holder") fiber_holder();
if (part == "laser_vblock") laser_vblock();
if (part == "shutter_bracket") shutter_bracket();
if (part == "shutter_flag") shutter_flag();
if (part == "beam_dump") beam_dump();
if (part == "rail_foot") rail_foot();
if (part == "corner_bracket") corner_bracket();
if (part == "enclosure_post") enclosure_post();
if (part == "electronics_tray") electronics_tray();
